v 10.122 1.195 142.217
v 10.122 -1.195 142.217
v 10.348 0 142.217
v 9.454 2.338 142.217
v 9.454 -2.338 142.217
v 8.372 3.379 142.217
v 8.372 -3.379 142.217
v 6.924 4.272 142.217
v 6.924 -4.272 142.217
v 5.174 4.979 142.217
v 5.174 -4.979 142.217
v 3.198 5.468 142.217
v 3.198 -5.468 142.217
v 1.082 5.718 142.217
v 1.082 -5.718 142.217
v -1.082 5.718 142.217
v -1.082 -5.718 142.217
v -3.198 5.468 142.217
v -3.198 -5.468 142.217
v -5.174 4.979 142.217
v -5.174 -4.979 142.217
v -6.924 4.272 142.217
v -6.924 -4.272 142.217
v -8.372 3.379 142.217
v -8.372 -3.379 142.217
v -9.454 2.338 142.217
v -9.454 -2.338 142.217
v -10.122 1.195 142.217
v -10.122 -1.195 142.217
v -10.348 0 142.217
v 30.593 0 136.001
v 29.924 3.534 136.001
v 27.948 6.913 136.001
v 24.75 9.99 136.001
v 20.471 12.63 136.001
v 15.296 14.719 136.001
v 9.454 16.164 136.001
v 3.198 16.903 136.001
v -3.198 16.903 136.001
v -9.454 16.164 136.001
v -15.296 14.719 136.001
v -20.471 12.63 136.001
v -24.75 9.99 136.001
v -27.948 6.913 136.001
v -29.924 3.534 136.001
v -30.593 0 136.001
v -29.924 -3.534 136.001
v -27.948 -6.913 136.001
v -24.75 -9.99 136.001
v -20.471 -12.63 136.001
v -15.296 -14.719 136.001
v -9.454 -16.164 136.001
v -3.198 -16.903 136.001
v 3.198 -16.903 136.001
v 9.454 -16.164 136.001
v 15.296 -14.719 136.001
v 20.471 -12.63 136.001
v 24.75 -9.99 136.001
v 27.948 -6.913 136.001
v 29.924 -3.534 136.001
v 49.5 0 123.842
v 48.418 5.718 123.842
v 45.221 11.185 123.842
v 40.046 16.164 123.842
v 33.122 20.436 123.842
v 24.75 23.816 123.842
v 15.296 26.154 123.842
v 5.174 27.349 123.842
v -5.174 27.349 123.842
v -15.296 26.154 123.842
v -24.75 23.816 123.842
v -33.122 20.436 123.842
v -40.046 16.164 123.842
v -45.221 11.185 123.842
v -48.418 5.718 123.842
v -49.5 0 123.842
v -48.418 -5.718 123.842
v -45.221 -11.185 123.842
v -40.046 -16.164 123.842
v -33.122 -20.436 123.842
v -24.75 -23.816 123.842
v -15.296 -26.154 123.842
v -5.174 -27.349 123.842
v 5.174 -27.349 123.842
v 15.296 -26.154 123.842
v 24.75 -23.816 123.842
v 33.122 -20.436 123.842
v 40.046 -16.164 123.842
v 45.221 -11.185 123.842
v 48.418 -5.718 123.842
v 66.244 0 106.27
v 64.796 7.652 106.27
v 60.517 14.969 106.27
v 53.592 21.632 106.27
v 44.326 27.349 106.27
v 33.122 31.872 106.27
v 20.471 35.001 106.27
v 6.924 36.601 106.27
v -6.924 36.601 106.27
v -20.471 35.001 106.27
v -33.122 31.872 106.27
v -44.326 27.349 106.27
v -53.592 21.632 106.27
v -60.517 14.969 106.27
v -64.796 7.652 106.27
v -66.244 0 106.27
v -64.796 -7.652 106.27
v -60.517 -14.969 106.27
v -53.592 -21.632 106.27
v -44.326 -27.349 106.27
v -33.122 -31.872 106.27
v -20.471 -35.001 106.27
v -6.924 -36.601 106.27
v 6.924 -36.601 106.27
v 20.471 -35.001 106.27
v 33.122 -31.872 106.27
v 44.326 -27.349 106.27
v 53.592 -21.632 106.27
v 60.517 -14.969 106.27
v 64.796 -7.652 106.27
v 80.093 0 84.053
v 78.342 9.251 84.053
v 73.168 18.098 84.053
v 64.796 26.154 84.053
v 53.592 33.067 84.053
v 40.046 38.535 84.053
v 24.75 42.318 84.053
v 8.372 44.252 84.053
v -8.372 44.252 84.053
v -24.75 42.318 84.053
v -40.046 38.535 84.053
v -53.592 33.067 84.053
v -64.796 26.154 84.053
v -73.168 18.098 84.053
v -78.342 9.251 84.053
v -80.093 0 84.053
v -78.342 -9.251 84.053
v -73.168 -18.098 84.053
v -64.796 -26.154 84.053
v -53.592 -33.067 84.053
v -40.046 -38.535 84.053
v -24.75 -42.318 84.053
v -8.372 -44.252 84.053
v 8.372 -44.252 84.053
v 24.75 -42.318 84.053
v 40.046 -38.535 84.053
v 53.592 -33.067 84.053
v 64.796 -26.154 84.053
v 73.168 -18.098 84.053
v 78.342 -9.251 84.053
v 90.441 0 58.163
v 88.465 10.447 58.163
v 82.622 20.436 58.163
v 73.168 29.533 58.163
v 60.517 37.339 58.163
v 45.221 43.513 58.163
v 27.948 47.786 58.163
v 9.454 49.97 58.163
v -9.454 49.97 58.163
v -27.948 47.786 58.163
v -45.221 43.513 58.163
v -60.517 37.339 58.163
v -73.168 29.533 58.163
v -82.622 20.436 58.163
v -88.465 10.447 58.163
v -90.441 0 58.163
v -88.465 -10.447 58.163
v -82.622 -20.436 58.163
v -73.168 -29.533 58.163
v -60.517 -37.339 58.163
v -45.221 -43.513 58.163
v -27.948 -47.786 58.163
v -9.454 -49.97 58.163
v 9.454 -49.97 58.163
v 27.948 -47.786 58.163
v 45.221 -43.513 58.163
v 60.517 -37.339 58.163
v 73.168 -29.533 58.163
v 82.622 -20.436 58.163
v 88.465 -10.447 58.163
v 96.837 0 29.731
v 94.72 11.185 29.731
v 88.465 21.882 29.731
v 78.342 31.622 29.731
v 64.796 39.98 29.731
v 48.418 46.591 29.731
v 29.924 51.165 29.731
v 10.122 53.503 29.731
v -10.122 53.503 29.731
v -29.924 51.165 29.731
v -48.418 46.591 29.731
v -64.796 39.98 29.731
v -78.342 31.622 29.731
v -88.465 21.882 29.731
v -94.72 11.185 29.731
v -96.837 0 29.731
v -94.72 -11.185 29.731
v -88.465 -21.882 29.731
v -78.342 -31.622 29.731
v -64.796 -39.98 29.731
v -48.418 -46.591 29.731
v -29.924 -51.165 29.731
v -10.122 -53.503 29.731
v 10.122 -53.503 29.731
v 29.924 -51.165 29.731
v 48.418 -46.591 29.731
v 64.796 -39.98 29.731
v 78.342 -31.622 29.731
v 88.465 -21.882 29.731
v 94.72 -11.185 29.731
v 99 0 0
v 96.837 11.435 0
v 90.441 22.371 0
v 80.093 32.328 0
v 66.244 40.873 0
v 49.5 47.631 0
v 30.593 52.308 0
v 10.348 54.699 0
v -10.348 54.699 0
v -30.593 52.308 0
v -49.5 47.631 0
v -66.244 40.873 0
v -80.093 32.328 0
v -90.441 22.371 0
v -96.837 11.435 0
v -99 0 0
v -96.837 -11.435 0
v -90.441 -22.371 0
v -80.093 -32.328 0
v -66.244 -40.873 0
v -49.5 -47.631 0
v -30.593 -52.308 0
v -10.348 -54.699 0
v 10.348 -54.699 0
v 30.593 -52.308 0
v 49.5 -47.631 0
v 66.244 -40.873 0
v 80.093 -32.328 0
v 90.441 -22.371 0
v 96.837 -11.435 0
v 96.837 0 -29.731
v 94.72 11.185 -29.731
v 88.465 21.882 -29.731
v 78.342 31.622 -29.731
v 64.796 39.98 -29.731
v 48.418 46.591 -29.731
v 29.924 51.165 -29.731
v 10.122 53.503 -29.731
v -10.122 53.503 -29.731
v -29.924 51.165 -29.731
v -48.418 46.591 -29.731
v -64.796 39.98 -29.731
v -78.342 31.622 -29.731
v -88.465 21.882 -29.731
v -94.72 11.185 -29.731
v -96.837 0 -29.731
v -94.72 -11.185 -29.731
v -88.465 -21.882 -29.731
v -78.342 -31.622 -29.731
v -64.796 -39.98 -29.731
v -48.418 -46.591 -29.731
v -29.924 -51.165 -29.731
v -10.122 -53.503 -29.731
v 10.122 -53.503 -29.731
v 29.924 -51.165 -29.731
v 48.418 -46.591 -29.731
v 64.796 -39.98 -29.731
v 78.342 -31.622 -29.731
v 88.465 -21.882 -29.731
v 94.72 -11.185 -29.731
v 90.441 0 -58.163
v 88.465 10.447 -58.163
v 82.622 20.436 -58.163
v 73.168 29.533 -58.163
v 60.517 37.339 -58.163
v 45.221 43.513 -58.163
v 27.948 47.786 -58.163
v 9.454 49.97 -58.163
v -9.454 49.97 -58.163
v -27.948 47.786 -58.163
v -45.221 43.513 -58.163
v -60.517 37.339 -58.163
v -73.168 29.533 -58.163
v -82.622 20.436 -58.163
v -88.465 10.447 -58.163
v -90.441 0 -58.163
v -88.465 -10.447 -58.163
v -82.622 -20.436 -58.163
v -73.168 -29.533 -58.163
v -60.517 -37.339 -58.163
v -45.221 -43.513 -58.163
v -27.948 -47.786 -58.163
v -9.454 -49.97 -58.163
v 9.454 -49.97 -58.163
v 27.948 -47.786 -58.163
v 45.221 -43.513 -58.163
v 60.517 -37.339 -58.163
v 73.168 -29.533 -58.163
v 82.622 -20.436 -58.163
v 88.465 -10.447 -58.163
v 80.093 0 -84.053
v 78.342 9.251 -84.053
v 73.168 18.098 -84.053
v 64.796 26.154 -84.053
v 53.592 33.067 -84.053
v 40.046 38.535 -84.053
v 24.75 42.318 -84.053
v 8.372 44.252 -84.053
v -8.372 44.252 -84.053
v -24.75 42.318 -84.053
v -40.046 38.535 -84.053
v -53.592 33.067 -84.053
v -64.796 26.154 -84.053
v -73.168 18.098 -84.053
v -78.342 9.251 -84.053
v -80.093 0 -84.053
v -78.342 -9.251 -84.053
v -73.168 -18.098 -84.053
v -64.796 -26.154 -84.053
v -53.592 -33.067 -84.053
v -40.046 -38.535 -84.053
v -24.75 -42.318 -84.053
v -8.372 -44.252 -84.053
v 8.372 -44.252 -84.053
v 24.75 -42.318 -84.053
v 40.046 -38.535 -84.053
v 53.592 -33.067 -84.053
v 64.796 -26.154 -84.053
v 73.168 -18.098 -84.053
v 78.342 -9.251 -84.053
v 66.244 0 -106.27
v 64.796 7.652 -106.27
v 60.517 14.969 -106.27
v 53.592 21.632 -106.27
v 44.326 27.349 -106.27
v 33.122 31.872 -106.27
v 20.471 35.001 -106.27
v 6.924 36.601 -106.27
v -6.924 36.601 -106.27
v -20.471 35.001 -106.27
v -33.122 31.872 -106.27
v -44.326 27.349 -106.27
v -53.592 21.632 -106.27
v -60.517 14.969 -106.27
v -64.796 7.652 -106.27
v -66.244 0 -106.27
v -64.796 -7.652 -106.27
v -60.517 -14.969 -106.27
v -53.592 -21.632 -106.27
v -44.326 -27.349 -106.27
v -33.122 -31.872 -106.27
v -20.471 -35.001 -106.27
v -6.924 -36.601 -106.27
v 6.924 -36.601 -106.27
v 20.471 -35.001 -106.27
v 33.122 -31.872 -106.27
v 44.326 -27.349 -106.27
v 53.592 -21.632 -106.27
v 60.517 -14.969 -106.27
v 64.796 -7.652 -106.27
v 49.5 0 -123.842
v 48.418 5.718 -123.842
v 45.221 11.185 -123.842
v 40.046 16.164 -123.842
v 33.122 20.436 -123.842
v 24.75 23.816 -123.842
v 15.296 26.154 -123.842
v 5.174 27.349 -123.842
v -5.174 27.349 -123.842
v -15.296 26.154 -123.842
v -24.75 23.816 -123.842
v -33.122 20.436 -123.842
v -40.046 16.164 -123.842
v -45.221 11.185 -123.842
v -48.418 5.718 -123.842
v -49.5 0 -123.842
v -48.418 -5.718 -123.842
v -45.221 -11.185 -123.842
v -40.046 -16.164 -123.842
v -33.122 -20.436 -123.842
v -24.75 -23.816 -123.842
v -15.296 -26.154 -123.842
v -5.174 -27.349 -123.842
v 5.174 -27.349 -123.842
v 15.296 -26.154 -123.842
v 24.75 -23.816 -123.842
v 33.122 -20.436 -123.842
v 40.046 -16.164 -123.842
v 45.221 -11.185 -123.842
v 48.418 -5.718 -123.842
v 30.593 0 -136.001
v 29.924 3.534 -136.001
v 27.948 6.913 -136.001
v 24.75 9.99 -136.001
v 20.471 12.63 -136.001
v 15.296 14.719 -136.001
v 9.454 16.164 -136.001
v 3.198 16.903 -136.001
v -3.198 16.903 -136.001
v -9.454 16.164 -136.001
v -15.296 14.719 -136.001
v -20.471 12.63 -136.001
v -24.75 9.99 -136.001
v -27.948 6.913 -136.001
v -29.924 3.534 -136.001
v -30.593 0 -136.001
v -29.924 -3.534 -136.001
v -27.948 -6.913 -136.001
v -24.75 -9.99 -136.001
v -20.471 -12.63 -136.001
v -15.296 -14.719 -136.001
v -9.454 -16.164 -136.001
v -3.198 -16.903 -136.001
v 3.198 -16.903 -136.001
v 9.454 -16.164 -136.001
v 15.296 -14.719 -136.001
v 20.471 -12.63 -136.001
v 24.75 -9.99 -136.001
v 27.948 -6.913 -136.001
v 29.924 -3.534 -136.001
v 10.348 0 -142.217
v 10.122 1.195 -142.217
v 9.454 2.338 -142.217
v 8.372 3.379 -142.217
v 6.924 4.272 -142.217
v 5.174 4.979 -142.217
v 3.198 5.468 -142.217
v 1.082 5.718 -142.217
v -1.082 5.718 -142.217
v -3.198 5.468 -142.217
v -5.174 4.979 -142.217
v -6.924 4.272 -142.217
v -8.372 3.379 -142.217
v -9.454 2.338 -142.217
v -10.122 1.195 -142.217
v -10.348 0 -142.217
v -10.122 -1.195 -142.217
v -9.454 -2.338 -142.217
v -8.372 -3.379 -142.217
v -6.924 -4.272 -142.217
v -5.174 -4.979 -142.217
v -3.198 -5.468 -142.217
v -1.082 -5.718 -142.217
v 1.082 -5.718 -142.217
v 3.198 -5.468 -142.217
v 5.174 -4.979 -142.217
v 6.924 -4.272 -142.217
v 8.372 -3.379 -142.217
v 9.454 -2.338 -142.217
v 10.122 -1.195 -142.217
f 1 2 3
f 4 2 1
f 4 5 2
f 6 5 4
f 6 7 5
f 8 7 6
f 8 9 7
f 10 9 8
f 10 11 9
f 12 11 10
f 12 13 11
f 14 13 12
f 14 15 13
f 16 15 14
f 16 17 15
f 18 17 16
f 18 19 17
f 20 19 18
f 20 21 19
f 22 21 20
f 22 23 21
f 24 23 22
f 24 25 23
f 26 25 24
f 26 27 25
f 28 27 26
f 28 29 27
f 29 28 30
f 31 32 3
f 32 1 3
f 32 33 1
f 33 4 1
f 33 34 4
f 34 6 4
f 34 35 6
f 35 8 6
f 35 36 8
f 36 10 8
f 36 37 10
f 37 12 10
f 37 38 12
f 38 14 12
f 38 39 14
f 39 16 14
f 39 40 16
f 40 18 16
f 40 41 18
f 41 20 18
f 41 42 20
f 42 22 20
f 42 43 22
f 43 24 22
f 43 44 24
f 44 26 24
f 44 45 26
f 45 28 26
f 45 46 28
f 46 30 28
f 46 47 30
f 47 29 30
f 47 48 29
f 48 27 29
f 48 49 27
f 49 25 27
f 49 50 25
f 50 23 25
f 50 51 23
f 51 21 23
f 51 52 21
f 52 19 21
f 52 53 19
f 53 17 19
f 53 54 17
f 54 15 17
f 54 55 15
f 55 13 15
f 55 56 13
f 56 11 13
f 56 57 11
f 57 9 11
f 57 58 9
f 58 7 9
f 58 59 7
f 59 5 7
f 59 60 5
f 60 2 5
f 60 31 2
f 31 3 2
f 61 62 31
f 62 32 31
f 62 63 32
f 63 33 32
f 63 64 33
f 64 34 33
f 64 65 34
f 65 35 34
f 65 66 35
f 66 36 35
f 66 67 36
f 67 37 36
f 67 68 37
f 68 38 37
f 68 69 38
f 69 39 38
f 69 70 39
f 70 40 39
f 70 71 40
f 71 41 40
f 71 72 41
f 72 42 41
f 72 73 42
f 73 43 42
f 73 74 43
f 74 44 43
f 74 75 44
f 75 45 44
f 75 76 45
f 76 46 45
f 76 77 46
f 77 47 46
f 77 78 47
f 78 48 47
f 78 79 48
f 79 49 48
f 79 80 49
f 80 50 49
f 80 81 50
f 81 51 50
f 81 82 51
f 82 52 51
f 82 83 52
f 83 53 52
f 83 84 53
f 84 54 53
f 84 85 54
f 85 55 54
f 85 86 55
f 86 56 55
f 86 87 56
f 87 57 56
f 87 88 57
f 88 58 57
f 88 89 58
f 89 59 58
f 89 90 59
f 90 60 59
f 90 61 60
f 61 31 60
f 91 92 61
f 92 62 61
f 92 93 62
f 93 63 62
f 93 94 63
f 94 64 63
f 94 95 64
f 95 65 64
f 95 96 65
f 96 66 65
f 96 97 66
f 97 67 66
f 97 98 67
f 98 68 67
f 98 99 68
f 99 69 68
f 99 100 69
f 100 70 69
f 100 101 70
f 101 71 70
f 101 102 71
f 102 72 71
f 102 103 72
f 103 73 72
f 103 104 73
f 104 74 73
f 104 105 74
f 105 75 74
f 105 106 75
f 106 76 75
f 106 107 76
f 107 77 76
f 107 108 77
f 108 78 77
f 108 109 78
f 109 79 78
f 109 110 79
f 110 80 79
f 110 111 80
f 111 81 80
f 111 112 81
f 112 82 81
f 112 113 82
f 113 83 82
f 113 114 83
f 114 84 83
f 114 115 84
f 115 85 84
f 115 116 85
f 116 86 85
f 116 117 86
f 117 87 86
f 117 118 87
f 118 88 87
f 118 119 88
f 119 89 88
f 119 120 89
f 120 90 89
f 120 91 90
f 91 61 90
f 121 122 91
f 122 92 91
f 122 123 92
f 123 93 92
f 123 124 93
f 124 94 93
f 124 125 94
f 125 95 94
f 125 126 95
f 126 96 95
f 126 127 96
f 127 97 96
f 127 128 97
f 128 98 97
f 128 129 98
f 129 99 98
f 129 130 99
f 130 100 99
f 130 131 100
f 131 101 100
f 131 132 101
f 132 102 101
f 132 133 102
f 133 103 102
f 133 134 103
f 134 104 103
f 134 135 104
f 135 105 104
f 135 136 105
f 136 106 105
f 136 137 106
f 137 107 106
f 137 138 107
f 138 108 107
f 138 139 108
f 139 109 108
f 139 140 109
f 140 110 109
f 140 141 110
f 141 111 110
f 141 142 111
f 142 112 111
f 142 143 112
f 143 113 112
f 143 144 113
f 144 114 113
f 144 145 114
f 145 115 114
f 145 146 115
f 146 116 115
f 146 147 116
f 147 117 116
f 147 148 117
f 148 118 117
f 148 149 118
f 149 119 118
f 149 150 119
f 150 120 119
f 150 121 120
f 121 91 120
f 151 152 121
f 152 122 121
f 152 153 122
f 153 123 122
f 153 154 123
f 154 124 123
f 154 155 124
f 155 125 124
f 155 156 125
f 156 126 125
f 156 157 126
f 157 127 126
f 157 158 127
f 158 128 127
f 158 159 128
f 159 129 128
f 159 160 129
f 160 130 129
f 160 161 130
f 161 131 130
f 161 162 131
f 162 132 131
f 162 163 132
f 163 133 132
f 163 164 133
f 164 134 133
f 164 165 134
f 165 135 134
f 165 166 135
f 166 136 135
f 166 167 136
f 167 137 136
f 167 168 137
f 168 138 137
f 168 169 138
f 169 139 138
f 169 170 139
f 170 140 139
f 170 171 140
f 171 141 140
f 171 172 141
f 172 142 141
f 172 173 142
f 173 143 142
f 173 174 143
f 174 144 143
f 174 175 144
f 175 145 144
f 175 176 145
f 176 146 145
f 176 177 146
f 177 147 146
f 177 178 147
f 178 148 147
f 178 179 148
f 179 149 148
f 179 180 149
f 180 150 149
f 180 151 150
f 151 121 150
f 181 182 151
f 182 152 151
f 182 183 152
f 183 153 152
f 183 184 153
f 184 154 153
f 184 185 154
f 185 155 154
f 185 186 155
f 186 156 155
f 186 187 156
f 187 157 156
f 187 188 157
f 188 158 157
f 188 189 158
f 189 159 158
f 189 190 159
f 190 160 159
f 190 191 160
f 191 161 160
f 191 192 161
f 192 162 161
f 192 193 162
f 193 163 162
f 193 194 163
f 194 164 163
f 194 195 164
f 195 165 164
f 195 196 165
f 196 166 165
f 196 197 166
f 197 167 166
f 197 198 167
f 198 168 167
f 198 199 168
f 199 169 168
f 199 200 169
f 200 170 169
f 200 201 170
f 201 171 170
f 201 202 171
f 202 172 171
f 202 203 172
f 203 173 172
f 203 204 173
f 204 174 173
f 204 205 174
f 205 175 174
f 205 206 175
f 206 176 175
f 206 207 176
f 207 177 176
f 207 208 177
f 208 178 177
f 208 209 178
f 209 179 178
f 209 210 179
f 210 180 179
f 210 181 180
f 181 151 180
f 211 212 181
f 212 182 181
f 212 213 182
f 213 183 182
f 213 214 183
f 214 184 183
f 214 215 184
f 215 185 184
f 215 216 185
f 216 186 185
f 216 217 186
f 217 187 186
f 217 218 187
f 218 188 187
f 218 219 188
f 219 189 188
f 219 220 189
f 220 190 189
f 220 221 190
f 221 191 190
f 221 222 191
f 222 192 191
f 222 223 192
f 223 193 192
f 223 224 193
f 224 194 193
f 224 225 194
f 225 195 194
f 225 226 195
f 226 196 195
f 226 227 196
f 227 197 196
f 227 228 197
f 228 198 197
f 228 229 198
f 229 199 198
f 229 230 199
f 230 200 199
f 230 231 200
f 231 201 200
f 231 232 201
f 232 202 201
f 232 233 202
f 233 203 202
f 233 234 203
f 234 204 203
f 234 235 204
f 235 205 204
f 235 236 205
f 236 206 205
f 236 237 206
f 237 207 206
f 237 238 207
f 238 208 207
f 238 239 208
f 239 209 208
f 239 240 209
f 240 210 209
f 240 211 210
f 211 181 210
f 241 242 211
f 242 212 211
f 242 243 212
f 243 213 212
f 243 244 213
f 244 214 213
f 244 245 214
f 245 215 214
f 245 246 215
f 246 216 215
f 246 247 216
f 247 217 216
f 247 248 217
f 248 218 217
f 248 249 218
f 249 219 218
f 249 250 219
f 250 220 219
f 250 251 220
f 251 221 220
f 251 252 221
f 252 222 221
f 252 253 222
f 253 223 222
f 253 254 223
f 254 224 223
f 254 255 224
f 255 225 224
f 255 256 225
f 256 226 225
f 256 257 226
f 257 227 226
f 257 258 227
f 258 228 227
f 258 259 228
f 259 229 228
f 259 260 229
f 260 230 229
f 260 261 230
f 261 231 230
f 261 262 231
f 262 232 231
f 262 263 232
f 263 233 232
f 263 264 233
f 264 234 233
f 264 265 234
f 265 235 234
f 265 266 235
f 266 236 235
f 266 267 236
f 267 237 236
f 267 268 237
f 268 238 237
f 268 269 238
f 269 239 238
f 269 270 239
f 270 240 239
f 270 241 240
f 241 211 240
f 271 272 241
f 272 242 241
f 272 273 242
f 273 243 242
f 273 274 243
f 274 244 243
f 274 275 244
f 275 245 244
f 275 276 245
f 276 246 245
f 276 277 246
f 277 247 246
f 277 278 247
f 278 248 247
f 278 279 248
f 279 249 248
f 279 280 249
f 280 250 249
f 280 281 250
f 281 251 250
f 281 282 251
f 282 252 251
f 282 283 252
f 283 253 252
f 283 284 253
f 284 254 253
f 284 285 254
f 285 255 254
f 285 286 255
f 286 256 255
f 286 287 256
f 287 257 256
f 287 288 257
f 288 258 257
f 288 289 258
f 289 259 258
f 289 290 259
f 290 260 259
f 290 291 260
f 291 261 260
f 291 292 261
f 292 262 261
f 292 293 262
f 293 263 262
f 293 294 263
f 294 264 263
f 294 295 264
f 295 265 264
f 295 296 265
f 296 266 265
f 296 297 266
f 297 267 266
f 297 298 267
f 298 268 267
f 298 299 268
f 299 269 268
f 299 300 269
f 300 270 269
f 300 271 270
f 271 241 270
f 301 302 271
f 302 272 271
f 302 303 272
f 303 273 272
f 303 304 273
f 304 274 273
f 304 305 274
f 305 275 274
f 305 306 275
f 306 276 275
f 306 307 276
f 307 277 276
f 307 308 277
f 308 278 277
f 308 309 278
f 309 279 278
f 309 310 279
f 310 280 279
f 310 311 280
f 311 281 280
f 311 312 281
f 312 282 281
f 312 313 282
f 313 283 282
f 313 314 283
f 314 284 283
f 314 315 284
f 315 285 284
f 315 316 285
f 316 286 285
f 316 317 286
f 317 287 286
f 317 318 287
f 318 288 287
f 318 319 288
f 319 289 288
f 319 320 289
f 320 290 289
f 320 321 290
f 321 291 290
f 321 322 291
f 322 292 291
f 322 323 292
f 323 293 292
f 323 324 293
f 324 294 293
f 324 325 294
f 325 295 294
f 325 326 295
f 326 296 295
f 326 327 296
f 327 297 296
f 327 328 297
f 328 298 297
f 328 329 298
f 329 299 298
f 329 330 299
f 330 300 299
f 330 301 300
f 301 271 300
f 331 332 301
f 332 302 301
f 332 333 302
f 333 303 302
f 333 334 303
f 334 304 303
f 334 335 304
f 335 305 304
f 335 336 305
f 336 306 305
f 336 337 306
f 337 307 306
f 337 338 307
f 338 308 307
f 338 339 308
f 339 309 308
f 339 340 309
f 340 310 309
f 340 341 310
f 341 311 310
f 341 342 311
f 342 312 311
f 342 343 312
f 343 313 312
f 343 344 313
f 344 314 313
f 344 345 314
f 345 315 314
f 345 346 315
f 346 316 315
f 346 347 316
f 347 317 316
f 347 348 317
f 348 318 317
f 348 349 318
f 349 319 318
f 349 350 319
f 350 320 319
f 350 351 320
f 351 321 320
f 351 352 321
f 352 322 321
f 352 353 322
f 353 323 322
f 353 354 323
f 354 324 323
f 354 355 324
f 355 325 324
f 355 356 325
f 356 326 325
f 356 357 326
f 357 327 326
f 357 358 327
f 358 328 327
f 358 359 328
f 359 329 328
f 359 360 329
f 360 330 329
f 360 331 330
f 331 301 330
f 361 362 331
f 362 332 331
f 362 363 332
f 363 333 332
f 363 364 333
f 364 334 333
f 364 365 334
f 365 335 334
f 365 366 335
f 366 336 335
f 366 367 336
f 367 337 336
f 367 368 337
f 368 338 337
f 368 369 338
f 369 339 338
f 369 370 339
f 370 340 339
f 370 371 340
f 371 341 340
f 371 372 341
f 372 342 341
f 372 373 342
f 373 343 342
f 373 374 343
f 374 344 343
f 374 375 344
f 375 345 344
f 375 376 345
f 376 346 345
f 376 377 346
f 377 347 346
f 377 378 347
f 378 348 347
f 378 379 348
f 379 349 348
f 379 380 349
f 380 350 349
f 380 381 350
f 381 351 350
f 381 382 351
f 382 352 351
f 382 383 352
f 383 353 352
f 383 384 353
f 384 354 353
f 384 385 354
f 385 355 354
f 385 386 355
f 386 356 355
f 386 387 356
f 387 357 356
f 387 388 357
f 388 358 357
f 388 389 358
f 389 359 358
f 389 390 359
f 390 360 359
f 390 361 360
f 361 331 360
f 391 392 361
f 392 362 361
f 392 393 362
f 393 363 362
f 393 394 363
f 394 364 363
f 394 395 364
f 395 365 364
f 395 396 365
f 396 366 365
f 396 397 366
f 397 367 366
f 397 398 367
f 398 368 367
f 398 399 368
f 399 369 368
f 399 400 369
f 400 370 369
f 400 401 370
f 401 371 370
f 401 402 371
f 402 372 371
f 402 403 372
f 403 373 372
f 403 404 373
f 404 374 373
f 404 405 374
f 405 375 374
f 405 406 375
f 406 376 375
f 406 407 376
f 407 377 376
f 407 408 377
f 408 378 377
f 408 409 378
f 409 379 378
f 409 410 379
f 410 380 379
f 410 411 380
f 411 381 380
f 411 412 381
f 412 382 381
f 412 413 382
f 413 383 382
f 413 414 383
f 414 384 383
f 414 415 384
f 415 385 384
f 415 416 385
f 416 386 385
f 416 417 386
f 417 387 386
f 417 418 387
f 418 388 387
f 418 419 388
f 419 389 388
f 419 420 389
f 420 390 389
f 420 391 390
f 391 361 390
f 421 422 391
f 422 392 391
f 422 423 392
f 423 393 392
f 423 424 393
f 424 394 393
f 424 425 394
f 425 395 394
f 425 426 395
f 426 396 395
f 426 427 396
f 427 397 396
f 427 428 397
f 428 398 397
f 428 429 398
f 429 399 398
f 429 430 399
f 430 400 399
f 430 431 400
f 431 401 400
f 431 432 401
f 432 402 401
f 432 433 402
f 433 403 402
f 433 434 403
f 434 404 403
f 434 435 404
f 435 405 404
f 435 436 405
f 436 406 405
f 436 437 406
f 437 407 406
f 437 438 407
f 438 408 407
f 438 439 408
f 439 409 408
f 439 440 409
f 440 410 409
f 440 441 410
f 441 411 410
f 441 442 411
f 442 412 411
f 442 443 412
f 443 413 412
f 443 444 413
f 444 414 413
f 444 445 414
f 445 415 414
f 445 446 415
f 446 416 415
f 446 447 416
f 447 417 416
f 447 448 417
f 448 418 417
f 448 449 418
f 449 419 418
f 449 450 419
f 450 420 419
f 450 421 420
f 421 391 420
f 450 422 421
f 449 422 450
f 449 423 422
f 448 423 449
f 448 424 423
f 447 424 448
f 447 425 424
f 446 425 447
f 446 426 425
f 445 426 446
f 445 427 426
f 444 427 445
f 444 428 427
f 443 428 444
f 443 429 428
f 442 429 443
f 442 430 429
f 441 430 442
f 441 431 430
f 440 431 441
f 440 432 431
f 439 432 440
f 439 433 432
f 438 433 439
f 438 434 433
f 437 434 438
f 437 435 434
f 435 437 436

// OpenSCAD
// Generated by SolidPython 1.0.1 on 2020-07-29 00:46:48


scale(v = [9, 5, 13]) {
	sphere(r = 11);
}
/***********************************************
*********      SolidPython code:      **********
************************************************
 
# import packages: SolidPython
from solid import *
from solid.utils import *
from itertools import chain, combinations, permutations


class Resize:

    def __init__(self, scad_file):
        self.scad_file = scad_file
        #self.scad_file = import_scad(scad_file)
        # cone/cylinder param:
        self.r1 = 0
        self.r2 = 0
        self.h = 0
        # rectangular prism param:
        self.w = 0
        self.l = 0
        # ellipse param:
        self.r = 0

    # import OpenScad code (file name corresponds to shape)


    # classify shape + parameters
    def assign(self, param1, param2, param3):
        if self.scad_file == 'cone.scad':
            self.r1 = param1
            self.r2 = param2
            self.h = param3
        elif self.scad_file == 'cylinder.scad':
            self.r1 = param1
            self.r2 = param2
            self.h = param3
        elif self.scad_file == 'rectangularPrism.scad':
            self.h = param1
            self.l = param2
            self.w = param3
        else:
            self.r = param1
            self.h = param2

    # resize parameters
    def iterate(self):
        x = range(3, 20, 2)
        i = 1
        if self.scad_file == 'cone.scad':
            tempList = list(permutations(x, 2))
            for temp in tempList:
                param1 = temp[0]
                param2 = temp[1]
                filepath = 'produced_scad_files/' + 'cone' + str(param1) + '_' + str(param2) + '_' + '.scad'
                scad_render_to_file(cylinder(h=param1, r1=param2, r2=0), filepath)

        elif self.scad_file == 'cylinder.scad':
            tempList = list(permutations(x, 3))
            for temp in tempList:
                param1 = temp[0]
                param2 = temp[1]
                filepath = 'produced_scad_files/' + 'cylinder' + str(param1) + '_' + str(param2) + '_' + '.scad'
                scad_render_to_file(cylinder(h=param1, r1=param2, r2=param2), filepath)

        elif self.scad_file == 'rectangularPrism.scad':
            tempList = list(permutations(x, 3))
            for temp in tempList:
                param1 = temp[0]
                param2 = temp[1]
                param3 = temp[2]
                filepath = 'produced_scad_files/' + 'rectangularPrism' + str(param1) + '_' + str(param2) + '_' + str(
                    param3) + '.scad'
                scad_render_to_file(cube(size=(param1, param2, param3)), filepath)

        elif self.scad_file == 'ellipse.scad':
            tempList = list(permutations(x, 4))
            for temp in tempList:
                param1 = temp[0]
                param2 = temp[1]
                param3 = temp[2]
                param4 = temp[3]
                filepath = 'produced_scad_files/' + 'ellipse' + str(param1) + '_' + str(param2) + '_' + str(param3) + '_' + str(param4) + '.scad'
                scad_render_to_file(scale([param1, param2, param3])(sphere(r=param4)), filepath)

    def render_to_scadfile(self):
        scad_render_to_file(scad, 'example.scad') 
 
************************************************/
